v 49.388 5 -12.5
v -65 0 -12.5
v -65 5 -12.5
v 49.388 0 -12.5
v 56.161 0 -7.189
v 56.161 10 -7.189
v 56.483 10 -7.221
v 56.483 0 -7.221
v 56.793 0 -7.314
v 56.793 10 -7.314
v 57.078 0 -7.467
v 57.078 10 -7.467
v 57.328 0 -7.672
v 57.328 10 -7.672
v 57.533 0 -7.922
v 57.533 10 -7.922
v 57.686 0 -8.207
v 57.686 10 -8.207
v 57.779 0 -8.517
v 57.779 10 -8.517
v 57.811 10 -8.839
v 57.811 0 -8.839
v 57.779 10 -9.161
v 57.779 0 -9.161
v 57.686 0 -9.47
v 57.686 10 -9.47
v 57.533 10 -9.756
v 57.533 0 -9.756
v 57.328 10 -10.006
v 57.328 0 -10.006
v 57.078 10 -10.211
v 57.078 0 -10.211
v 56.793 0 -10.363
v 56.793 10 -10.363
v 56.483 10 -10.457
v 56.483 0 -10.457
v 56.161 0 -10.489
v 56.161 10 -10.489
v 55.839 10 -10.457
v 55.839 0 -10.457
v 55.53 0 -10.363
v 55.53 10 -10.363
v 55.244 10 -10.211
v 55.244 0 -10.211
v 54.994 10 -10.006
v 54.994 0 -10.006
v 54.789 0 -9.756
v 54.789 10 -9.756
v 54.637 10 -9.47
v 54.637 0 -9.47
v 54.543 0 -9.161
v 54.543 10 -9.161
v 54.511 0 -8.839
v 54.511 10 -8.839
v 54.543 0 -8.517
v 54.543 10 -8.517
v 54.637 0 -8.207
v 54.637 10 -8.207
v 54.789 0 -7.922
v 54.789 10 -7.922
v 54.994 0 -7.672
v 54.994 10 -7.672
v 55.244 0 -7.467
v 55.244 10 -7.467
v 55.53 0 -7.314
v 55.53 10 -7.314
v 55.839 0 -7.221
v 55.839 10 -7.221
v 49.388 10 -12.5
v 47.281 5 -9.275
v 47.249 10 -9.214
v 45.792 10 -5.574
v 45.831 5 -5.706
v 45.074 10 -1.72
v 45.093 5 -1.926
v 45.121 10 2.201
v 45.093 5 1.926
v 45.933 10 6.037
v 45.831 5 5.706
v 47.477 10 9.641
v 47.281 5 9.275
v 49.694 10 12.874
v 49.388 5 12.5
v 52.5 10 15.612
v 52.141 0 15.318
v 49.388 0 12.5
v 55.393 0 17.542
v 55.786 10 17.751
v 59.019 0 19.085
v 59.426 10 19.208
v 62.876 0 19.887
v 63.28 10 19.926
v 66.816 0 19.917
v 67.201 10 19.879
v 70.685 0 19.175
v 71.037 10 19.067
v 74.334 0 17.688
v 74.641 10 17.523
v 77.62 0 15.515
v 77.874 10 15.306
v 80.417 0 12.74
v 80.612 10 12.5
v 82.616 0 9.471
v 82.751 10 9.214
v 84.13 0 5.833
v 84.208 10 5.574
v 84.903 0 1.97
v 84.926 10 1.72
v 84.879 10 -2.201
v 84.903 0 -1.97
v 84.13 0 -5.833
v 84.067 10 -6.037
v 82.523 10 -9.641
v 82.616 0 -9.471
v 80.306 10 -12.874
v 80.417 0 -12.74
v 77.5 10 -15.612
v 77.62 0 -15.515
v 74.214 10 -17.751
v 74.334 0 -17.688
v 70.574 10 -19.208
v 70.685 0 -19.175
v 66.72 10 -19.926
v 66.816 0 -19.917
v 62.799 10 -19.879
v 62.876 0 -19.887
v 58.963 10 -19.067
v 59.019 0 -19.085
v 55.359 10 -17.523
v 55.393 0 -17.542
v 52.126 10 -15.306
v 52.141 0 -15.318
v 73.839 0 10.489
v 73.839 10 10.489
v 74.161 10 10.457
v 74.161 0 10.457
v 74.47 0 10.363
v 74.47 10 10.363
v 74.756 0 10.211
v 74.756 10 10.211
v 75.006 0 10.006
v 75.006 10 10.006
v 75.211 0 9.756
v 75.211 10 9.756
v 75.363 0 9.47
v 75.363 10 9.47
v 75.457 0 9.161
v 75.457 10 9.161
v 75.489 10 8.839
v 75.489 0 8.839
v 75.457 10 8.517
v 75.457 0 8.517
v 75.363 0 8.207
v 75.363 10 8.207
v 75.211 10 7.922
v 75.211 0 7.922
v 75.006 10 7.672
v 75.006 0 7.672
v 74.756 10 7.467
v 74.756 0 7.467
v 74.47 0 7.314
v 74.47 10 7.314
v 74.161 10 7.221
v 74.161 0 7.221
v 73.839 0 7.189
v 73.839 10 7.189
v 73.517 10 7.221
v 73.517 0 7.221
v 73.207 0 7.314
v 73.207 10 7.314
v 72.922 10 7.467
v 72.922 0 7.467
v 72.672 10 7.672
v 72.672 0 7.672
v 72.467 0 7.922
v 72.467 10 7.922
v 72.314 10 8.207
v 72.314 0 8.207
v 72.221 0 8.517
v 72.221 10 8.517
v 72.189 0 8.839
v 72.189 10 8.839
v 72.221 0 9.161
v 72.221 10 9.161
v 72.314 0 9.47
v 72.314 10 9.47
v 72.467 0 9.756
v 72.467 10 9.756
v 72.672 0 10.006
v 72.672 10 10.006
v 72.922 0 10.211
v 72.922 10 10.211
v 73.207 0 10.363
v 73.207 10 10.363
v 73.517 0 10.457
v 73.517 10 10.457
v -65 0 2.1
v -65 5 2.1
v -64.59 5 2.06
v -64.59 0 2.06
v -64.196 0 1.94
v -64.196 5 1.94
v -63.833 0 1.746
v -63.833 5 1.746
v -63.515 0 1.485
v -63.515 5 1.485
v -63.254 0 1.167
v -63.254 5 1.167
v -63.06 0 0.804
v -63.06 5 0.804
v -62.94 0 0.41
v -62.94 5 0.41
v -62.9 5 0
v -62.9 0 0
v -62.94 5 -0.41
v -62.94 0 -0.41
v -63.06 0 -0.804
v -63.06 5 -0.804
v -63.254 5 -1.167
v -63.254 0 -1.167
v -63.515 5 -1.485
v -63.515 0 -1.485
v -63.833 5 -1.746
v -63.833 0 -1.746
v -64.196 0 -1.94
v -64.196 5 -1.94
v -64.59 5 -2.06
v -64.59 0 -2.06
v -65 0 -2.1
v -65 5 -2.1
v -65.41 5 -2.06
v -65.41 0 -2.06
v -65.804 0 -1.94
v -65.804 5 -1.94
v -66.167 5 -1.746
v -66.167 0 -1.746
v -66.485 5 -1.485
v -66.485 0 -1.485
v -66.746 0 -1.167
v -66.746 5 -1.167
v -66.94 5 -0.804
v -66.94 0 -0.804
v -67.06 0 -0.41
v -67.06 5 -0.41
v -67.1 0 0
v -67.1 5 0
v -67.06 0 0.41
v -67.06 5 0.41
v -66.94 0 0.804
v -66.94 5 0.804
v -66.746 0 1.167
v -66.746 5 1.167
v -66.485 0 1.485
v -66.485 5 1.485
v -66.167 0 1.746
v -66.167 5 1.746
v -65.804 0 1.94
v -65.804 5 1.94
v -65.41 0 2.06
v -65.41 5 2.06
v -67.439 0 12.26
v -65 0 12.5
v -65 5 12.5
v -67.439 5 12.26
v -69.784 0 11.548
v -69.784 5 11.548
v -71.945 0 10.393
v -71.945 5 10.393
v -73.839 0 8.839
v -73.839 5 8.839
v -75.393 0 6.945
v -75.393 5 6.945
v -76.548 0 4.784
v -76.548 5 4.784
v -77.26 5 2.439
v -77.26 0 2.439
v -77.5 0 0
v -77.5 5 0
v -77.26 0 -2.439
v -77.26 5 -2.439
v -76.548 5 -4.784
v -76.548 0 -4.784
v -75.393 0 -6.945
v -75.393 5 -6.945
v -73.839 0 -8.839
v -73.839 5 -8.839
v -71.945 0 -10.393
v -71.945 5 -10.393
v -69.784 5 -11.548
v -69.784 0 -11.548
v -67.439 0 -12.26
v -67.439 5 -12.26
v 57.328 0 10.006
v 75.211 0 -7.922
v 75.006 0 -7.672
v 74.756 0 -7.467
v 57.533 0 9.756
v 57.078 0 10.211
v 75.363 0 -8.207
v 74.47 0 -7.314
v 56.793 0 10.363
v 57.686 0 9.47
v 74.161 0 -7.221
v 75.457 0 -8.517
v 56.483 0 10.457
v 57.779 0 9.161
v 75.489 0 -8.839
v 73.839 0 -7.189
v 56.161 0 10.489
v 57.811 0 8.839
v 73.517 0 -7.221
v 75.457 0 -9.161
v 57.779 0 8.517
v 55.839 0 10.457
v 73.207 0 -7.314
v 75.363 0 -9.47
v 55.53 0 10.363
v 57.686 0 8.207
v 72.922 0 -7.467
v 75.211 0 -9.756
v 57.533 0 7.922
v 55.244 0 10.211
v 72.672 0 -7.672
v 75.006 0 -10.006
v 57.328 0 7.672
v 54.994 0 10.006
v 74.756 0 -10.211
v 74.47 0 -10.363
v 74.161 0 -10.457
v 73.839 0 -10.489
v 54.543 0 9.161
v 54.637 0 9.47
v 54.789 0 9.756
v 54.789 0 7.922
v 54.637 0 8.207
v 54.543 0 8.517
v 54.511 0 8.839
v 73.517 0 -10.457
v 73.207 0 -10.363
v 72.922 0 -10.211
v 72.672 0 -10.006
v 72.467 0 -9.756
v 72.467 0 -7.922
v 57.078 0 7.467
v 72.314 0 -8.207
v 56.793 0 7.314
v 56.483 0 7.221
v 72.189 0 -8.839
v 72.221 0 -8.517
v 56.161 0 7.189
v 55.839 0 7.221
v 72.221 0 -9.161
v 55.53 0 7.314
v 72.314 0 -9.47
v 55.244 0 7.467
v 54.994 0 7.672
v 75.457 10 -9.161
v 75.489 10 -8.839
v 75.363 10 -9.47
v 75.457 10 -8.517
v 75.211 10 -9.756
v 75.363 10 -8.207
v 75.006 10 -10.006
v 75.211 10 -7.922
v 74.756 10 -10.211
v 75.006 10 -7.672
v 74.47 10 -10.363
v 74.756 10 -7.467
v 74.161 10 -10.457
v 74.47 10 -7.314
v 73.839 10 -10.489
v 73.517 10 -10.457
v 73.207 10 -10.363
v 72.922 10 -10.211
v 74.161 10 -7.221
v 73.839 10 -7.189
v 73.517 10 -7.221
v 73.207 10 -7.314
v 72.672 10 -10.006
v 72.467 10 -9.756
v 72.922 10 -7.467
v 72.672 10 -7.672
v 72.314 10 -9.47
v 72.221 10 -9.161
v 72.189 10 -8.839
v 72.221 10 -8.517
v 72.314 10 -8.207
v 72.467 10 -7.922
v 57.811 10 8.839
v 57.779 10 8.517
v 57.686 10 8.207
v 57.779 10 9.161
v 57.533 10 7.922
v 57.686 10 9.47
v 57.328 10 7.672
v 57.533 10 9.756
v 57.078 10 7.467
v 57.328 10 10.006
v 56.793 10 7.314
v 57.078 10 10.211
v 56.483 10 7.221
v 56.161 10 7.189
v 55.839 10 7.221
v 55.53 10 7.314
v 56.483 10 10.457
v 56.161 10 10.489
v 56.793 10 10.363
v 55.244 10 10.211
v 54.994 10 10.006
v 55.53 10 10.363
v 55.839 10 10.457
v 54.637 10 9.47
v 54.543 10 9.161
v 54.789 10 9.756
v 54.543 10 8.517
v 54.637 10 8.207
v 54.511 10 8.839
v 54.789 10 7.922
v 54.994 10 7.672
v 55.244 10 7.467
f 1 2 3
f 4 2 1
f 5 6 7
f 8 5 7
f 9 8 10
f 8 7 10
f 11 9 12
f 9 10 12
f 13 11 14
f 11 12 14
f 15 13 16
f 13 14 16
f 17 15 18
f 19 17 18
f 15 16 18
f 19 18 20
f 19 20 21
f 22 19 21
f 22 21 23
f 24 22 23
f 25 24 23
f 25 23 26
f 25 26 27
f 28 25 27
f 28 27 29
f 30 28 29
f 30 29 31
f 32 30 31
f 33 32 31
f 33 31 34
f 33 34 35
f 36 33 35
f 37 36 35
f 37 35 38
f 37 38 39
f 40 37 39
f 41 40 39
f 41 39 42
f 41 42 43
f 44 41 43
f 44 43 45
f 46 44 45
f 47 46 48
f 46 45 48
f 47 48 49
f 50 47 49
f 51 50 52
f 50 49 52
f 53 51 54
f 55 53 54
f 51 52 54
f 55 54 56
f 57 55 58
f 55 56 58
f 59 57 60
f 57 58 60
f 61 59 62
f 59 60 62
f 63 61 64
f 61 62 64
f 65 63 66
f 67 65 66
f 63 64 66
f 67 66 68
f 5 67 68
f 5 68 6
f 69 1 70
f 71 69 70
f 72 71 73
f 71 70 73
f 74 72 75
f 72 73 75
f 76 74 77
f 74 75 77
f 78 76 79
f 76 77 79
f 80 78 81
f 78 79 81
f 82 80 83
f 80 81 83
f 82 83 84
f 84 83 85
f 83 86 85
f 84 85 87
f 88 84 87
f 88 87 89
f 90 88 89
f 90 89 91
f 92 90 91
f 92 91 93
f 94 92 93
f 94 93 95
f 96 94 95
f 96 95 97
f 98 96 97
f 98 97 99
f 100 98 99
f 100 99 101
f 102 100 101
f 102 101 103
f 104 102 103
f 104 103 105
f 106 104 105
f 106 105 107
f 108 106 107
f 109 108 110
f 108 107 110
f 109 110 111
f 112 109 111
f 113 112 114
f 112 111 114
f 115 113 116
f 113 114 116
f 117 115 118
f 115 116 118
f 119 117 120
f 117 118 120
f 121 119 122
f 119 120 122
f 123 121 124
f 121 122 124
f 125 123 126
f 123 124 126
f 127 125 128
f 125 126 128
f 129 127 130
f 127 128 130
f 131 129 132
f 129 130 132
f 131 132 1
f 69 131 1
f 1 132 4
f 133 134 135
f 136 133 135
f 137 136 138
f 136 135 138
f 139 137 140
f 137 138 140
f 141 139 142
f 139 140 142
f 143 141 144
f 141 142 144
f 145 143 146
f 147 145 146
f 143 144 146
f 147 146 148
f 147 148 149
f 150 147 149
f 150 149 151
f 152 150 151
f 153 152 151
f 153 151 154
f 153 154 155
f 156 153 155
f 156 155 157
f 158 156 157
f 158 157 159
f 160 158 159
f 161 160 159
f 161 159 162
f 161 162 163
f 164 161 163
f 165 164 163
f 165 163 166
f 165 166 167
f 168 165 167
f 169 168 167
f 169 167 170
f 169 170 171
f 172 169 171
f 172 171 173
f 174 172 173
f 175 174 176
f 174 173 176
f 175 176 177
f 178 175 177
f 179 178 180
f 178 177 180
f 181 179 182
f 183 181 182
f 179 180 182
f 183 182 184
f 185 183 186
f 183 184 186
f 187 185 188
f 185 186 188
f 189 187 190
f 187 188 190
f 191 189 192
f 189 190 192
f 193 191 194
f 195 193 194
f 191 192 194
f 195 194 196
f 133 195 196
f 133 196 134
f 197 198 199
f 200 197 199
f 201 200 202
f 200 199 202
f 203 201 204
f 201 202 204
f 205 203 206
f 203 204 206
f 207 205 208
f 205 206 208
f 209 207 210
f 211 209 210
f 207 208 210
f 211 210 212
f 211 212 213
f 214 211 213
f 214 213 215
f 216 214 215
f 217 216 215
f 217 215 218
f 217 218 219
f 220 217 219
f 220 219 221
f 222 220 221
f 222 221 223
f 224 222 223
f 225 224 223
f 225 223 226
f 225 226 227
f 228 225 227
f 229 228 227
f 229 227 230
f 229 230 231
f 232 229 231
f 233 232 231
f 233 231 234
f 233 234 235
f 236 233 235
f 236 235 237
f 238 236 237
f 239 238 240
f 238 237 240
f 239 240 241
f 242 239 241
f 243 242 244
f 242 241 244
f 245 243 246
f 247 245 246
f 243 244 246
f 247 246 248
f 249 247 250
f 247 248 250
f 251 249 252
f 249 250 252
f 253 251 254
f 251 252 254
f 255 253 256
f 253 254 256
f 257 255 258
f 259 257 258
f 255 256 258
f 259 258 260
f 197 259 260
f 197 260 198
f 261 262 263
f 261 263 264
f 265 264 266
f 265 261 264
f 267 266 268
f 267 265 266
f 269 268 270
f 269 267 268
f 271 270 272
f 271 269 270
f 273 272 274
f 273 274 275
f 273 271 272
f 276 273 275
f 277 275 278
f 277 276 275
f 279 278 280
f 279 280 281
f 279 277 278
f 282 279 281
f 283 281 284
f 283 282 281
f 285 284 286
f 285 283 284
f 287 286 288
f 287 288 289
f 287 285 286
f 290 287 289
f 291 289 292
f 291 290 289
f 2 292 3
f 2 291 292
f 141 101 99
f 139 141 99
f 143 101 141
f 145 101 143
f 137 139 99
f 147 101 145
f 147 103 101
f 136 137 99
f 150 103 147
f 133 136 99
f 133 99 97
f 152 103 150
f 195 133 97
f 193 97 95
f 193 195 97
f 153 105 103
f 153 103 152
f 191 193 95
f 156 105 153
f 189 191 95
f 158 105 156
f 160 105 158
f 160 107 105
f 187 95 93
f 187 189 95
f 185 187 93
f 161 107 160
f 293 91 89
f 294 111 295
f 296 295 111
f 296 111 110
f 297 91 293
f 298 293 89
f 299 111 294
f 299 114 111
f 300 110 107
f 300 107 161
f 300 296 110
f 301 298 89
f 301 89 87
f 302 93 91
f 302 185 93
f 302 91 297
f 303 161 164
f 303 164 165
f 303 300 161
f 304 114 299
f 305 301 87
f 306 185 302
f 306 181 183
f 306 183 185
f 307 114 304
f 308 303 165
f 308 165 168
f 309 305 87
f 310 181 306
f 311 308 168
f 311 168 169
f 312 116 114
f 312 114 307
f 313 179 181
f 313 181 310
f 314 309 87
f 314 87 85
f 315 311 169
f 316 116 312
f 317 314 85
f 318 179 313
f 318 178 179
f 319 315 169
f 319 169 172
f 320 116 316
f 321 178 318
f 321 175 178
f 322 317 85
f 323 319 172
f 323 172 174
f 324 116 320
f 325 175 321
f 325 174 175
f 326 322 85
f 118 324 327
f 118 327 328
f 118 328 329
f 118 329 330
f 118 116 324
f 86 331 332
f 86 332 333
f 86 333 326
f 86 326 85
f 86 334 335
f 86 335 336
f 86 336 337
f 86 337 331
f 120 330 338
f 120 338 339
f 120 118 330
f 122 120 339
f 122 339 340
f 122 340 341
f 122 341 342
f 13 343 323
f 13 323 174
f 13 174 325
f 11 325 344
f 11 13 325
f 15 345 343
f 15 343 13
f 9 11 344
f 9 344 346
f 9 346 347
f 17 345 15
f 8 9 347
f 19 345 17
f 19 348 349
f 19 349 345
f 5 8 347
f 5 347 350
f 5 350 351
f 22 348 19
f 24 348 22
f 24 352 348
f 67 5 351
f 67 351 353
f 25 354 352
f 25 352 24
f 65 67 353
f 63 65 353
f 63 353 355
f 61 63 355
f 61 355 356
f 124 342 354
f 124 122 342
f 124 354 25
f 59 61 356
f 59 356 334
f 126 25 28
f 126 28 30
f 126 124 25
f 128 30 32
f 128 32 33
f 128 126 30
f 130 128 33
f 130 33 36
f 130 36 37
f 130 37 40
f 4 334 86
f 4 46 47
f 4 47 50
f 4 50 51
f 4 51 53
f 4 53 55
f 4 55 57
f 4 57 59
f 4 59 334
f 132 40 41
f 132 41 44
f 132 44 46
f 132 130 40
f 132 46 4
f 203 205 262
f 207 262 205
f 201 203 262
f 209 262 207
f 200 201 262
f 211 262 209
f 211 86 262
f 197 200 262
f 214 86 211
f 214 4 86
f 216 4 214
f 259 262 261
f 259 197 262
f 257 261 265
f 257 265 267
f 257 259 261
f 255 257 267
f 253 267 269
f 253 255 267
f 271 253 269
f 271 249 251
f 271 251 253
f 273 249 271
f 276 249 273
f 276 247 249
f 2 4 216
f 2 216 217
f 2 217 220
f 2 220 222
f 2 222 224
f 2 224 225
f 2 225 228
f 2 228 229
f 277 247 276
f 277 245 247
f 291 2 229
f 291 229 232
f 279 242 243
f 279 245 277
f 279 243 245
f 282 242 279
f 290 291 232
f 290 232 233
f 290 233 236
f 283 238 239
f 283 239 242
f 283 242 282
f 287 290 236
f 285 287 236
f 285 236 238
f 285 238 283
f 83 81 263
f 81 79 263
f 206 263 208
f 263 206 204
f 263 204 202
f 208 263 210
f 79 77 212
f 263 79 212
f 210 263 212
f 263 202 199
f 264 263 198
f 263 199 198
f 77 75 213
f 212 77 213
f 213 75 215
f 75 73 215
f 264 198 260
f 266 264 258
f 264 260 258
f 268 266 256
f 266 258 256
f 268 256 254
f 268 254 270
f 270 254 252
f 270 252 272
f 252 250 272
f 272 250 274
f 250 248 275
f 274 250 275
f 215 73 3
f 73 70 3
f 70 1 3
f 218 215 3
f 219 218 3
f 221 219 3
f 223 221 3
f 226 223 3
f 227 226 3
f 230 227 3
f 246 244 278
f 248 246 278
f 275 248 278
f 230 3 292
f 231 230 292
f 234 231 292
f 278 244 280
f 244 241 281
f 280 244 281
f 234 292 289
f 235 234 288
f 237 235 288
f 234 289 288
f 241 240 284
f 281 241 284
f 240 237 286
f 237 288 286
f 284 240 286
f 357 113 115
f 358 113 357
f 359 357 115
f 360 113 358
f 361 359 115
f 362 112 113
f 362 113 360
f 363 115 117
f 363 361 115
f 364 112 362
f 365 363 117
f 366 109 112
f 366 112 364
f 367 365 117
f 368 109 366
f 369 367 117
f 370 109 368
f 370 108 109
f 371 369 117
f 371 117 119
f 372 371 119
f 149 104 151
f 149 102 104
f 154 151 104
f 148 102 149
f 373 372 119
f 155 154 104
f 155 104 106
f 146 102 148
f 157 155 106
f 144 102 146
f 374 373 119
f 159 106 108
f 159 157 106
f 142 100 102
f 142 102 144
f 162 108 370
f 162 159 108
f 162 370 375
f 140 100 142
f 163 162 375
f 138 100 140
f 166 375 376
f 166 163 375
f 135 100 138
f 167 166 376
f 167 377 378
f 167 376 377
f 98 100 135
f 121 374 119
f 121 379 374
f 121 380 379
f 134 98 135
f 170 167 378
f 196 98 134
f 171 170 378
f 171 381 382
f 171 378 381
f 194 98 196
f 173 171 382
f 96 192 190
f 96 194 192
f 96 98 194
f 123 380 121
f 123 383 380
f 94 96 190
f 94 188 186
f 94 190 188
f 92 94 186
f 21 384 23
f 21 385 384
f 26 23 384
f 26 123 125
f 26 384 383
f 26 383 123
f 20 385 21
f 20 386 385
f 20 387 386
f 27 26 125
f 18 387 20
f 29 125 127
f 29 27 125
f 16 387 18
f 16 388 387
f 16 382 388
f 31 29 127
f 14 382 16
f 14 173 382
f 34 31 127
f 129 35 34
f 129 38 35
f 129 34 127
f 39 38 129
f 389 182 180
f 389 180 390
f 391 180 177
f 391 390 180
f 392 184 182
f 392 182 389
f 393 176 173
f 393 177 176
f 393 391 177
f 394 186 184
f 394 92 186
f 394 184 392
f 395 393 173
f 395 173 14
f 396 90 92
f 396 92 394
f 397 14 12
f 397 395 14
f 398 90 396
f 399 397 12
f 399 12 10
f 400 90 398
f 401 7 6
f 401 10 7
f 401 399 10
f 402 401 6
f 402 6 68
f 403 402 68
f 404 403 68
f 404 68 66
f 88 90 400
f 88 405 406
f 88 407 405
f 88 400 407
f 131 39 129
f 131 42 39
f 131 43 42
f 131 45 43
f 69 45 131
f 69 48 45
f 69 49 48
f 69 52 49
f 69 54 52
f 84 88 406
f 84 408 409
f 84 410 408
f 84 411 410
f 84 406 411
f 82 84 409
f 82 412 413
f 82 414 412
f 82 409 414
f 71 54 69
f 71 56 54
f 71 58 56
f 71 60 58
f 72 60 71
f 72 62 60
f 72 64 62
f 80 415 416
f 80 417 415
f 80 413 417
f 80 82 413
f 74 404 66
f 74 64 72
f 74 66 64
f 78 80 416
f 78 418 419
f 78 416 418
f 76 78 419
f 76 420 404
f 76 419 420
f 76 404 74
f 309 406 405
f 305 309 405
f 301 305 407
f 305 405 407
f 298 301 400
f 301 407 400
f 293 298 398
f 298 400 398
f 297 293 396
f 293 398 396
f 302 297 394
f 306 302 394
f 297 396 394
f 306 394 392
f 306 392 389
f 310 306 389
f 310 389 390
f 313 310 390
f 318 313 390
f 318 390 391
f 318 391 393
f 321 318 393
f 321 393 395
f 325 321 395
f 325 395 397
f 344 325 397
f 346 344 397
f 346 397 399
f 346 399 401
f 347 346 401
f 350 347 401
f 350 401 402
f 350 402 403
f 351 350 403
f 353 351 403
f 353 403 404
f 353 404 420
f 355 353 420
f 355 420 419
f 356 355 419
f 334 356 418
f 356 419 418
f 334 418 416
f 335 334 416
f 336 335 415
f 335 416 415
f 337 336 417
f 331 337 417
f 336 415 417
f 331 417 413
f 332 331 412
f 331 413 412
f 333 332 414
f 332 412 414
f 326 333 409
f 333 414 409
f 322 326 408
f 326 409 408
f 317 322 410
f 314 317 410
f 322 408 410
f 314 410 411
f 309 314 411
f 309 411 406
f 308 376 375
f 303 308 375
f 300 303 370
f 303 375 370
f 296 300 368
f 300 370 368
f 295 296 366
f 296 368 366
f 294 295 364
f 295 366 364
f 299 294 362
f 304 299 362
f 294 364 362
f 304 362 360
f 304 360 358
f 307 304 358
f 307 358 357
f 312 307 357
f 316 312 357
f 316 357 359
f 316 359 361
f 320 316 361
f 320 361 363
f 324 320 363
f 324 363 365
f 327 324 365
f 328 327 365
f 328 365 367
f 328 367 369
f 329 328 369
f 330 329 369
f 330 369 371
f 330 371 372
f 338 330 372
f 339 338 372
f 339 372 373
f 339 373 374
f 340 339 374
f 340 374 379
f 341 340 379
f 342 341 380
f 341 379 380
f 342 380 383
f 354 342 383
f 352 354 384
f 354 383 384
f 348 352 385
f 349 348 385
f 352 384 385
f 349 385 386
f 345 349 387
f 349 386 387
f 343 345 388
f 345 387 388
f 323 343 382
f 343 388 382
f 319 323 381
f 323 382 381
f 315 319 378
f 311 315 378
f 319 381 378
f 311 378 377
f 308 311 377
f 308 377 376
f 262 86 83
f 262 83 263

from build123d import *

# Parameters (mm, degrees)
EXTRUDE_1_DEPTH     = 5
SKETCH_7_R          = 20
EXTRUDE_3_DEPTH     = 10
CUT_EXTRUDE_2_REACH = 89.892
SKETCH_8_R          = 1.65
CUT_EXTRUDE_3_REACH = 89.464
SKETCH_9_R          = 2.1


with BuildPart() as part:
    # 草图1 → 凸台-拉伸1 (new body)
    with BuildSketch(Plane(origin=(0, 0, 0), x_dir=(1, 0, 0), z_dir=(0, 1, 0))):
        with BuildLine():
            Line((-65, 12.5), (65, 12.5))
            ThreePointArc((65, 12.5), (77.5, 0), (65, -12.5))
            Line((65, -12.5), (-65, -12.5))
            ThreePointArc((-65, -12.5), (-77.5, 0), (-65, 12.5))
        make_face()
    extrude(amount=EXTRUDE_1_DEPTH)

    # 草图7 → 凸台-拉伸3 (add)
    with BuildSketch(Plane(origin=(0, 0, 0), x_dir=(1, 0, 0), z_dir=(0, 1, 0))):
        with Locations(Location((65, 0, 0), (0, 0, 141.317812547))):
            Circle(SKETCH_7_R)
    extrude(amount=EXTRUDE_3_DEPTH)

    # 草图8 → 切除-拉伸2 (cut, up to next)
    with BuildSketch(Plane(origin=(0, 10, 0), x_dir=(1, 0, 0), z_dir=(0, 1, 0)), mode=Mode.PRIVATE) as cut_extrude_2_sk1:
        with Locations(Location((56.161165235, 8.838834765, 0), (0, 0, 270))):
            Circle(SKETCH_8_R)
    cut_extrude_2_tool1 = extrude(cut_extrude_2_sk1.sketch, amount=-CUT_EXTRUDE_2_REACH, mode=Mode.PRIVATE) & part.part
    # 草图8 → 切除-拉伸2 (cut, up to next)
    with BuildSketch(Plane(origin=(0, 10, 0), x_dir=(1, 0, 0), z_dir=(0, 1, 0)), mode=Mode.PRIVATE) as cut_extrude_2_sk2:
        with Locations(Location((73.838834765, 8.838834765, 0), (0, 0, 270))):
            Circle(SKETCH_8_R)
    cut_extrude_2_tool2 = extrude(cut_extrude_2_sk2.sketch, amount=-CUT_EXTRUDE_2_REACH, mode=Mode.PRIVATE) & part.part
    # 草图8 → 切除-拉伸2 (cut, up to next)
    with BuildSketch(Plane(origin=(0, 10, 0), x_dir=(1, 0, 0), z_dir=(0, 1, 0)), mode=Mode.PRIVATE) as cut_extrude_2_sk3:
        with Locations(Location((73.838834765, -8.838834765, 0), (0, 0, 270))):
            Circle(SKETCH_8_R)
    cut_extrude_2_tool3 = extrude(cut_extrude_2_sk3.sketch, amount=-CUT_EXTRUDE_2_REACH, mode=Mode.PRIVATE) & part.part
    # 草图8 → 切除-拉伸2 (cut, up to next)
    with BuildSketch(Plane(origin=(0, 10, 0), x_dir=(1, 0, 0), z_dir=(0, 1, 0)), mode=Mode.PRIVATE) as cut_extrude_2_sk4:
        with Locations(Location((56.161165235, -8.838834765, 0), (0, 0, 270))):
            Circle(SKETCH_8_R)
    cut_extrude_2_tool4 = extrude(cut_extrude_2_sk4.sketch, amount=-CUT_EXTRUDE_2_REACH, mode=Mode.PRIVATE) & part.part
    add(cut_extrude_2_tool1.solids().sort_by_distance((56.161165, 10, -8.838835))[0], mode=Mode.SUBTRACT)
    add(cut_extrude_2_tool2.solids().sort_by_distance((73.838835, 10, -8.838835))[0], mode=Mode.SUBTRACT)
    add(cut_extrude_2_tool3.solids().sort_by_distance((73.838835, 10, 8.838835))[0], mode=Mode.SUBTRACT)
    add(cut_extrude_2_tool4.solids().sort_by_distance((56.161165, 10, 8.838835))[0], mode=Mode.SUBTRACT)

    # 草图9 → 切除-拉伸3 (cut, up to next)
    with BuildSketch(Plane(origin=(0, 5, 0), x_dir=(1, 0, 0), z_dir=(0, 1, 0)), mode=Mode.PRIVATE) as cut_extrude_3_sk1:
        with Locations(Location((-65, 0, 0), (0, 0, 270))):
            Circle(SKETCH_9_R)
    cut_extrude_3_tool1 = extrude(cut_extrude_3_sk1.sketch, amount=-CUT_EXTRUDE_3_REACH, mode=Mode.PRIVATE) & part.part
    add(cut_extrude_3_tool1.solids().sort_by_distance((-65, 5, 0))[0], mode=Mode.SUBTRACT)


solid = part.part
